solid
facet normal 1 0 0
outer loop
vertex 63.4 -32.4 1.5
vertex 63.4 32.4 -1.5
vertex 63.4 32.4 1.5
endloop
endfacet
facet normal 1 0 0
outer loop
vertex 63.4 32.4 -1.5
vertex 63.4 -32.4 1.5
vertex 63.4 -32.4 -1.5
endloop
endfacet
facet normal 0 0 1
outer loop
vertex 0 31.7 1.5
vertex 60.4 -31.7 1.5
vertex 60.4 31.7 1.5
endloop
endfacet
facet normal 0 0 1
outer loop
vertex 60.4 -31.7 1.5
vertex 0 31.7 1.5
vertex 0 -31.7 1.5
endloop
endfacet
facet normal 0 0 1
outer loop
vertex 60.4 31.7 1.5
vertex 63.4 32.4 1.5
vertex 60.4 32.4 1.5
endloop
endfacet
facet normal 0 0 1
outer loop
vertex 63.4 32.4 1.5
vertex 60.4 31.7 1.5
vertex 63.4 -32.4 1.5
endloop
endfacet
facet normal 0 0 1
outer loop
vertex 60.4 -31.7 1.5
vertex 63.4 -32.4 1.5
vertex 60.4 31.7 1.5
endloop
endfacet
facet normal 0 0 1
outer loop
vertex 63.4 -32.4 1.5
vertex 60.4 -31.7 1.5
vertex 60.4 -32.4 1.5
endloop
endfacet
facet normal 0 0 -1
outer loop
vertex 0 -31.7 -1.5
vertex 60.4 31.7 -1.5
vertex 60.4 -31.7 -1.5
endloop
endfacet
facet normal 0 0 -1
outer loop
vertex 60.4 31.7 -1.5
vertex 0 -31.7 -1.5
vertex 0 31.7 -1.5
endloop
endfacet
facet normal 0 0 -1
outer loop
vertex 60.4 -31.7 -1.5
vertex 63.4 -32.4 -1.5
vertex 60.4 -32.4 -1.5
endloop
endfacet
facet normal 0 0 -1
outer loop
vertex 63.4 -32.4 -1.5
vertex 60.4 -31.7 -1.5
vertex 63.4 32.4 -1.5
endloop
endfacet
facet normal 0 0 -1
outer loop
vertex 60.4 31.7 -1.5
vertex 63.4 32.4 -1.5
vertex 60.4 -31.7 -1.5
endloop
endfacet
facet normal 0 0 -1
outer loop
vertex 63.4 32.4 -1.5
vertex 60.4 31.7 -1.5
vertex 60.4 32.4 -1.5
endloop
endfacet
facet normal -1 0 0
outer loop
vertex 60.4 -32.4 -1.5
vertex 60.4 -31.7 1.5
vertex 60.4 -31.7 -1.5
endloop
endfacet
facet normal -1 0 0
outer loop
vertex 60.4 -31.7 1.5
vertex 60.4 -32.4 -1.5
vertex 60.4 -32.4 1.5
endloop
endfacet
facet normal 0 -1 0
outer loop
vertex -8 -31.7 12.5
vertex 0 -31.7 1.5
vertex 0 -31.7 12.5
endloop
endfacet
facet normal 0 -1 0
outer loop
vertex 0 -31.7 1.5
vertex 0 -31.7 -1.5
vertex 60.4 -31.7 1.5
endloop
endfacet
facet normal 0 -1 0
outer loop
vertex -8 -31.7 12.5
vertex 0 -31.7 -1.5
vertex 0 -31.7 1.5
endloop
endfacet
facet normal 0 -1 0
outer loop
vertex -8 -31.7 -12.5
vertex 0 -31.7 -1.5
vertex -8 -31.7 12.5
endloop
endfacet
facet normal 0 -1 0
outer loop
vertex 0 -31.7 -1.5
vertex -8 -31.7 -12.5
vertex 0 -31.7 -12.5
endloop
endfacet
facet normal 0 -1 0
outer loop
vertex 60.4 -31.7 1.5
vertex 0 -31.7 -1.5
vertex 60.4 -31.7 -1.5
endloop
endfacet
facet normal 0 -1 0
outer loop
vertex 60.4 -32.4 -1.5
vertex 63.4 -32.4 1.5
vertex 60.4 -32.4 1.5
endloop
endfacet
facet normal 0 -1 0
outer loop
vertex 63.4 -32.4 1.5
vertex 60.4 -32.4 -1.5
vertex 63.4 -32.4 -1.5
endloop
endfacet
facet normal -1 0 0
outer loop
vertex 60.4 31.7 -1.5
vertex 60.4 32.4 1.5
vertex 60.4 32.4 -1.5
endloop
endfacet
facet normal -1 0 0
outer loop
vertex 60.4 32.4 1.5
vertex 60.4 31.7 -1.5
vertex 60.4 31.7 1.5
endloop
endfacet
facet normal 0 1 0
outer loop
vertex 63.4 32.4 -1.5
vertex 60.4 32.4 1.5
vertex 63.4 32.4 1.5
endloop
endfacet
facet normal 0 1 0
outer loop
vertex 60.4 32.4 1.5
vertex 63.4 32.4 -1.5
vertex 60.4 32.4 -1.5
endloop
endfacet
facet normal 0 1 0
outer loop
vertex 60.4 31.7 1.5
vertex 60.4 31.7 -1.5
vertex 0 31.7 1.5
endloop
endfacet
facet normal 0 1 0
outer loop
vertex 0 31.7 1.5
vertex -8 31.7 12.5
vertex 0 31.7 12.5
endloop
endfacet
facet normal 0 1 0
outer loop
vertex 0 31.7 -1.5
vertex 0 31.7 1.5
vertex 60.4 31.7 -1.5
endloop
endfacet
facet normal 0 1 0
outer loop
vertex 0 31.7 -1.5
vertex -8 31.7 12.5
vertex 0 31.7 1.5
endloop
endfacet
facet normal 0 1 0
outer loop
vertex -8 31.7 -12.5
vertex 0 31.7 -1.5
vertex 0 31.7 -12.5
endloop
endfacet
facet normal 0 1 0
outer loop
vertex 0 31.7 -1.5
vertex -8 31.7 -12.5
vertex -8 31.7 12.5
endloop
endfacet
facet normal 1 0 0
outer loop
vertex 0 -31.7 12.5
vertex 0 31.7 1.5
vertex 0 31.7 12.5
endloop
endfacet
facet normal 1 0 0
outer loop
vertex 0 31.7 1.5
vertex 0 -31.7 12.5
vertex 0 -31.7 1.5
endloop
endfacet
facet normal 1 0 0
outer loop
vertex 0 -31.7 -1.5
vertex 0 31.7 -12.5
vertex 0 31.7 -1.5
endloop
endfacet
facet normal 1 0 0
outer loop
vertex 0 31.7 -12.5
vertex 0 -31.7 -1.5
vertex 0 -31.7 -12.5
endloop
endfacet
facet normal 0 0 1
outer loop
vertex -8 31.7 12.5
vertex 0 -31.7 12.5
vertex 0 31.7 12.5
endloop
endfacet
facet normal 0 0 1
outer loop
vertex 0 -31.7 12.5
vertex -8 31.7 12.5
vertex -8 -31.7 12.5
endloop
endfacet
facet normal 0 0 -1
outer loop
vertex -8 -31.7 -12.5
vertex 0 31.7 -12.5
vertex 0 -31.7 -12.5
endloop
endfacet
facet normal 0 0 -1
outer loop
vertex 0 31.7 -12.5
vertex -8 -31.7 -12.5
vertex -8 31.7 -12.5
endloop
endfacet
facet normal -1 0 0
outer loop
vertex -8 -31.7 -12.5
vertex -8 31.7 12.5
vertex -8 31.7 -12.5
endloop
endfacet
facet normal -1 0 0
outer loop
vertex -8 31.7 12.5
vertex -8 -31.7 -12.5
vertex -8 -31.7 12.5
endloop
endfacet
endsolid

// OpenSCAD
// file: _blast_gate.scad
// =====================================
// Blast Gate — Shared Library
// Inline sliding blast gate for 51mm OD PVC workshop vacuum lines.
// Sliding blade opens or closes airflow to dust-collection branches.
//
// Coordinate system:
//   Pipe axis: Z. Blade slides along X (handle exits at −X).
//   Slot lies in the X–Y plane, slot_h tall in Z.
//
// bore_d matches socket_id so the body bore is flush with the socket bore (no dust ledge).
//
// Print notes:
//   Body: print with pipe axis vertical (Z-up); slot is horizontal.
//   Supports may be needed to bridge the bore opening at the slot ceiling.
//   Blade: print flat on the build plate.
//
// Stop bump (prevents blade pulling fully out of slot) is omitted in v1.0.0.
// Add a bump on the blade leading edge if desired.
// =====================================

$fn = 64;

// === Parameters (mm) ===

// Pipe
pvc_od           = 51;     // PVC pipe outer diameter — widened 1 mm for slip fit on 50 mm nominal pipe
socket_clearance = 0.4;    // diametral slip-fit clearance on socket bore
socket_id        = pvc_od + socket_clearance;  // 51.4
socket_wall      = 2.5;
socket_od        = socket_id + 2*socket_wall;  // 56.4
socket_length    = 25;     // pipe insertion depth per side

// Internal flow bore: matches socket_id so no ledge forms at the socket/body junction
bore_d           = socket_id;

// Body block (square cross-section, slot through the middle)
frame            = 8;                    // material thickness around bore
body_w           = bore_d + 2*frame;    // Y extent (perpendicular to blade slide)
body_d           = bore_d + 2*frame;    // X extent (along blade slide direction)
plate_t          = 4;                   // plate thickness above/below the slot
end_wall         = 4;                   // closed-end wall at +X joining top/bottom plates; slot open at −X for blade entry
slot_h           = 3.4;                 // gate_thickness + 0.4mm total clearance
body_h           = 2*plate_t + slot_h;  // 11.4 — Z extent between socket bases

// Blade
gate_thickness   = 3;
y_rail           = 2;                  // Y-wall reserve per side; printed wall = y_rail − 0.2 after slot clearance
blade_w          = body_w - 2*y_rail; // narrower than body so Y walls remain intact
blade_travel     = bore_d + 6;         // travel so solid blade fully covers bore
blade_l          = body_d - end_wall;  // spans exactly the slot length in X
handle_w         = blade_w;
handle_t         = 8;                  // handle depth in X
handle_l         = 25;                 // handle height in Z (perpendicular to blade plane)

// Mounting plate (opposite blade-exit side, at +X end of body block)
mount_plate_t      = 4;                           // plate thickness in X
mount_plate_margin = 10;                          // extends this far beyond body_block on Y and Z per side
mount_plate_w      = body_w + 2*mount_plate_margin;
mount_plate_h      = body_h + 2*mount_plate_margin;
mount_hole_d       = 4;                           // M4 / #8 screw clearance
mount_hole_inset   = 5;                           // hole-centre distance from plate edge

// Catch notches (blade-closed retention)
catch_notch_depth = 0.8;  // depth into Y-wall (mm); keeps ≥1 mm of wall remaining
catch_notch_width = 3.0;  // notch extent along X (blade travel direction)
catch_bump_h      = catch_notch_depth - 0.1;  // bump protrusion from blade edge; 0.1 mm clearance at notch far wall

// === Modules ===

// One pipe socket. z_base: Z coordinate of the socket base face.
module socket_stub(z_base) {
    translate([0, 0, z_base])
        difference() {
            cylinder(d=socket_od, h=socket_length);
            translate([0, 0, -0.1])
                cylinder(d=socket_id, h=socket_length + 0.2);
        }
}

// Central body block: plate material above and below the blade slot.
module body_block() {
    difference() {
        cube([body_d, body_w, body_h], center=true);
        // Bore cylinder along pipe axis (Z)
        cylinder(d=bore_d, h=body_h + 1, center=true);
        // Blade slot: open at -X (blade entry), closed at +X by end_wall; Y side walls remain
        translate([-body_d/2 - 1, -(blade_w + 0.4)/2, -slot_h/2])
            cube([body_d + 1 - end_wall, blade_w + 0.4, slot_h]);
        // Catch notches: small recesses in Y-walls at the fully-closed blade position.
        // When the blade is pushed in, its edges snap into these wider pockets and
        // resist sliding back open under vibration.
        for (y_sign = [-1, 1]) {
            translate([body_d/2 - end_wall - catch_notch_width,
                       y_sign > 0 ? (blade_w + 0.4)/2 : -(blade_w + 0.4)/2 - catch_notch_depth,
                       -gate_thickness/2])
                cube([catch_notch_width, catch_notch_depth, gate_thickness]);
        }
    }
}

// Full gate body: central block plus top and bottom pipe sockets.
module gate_body() {
    union() {
        body_block();
        socket_stub(body_h/2);                  // top socket
        socket_stub(-body_h/2 - socket_length); // bottom socket
        mount_plate();
    }
}

// Mounting plate on the +X (closed-end) face, opposite the blade-exit opening.
// Screw holes pass through the plate along X (perpendicular to the mounting surface).
module mount_plate() {
    translate([body_d/2, 0, 0])
    difference() {
        translate([0, -mount_plate_w/2, -mount_plate_h/2])
            cube([mount_plate_t, mount_plate_w, mount_plate_h]);
        for (y_sign = [-1, 1]) {
            for (z_sign = [-1, 1]) {
                translate([-0.1,
                           y_sign * (mount_plate_w/2 - mount_hole_inset),
                           z_sign * (mount_plate_h/2 - mount_hole_inset)])
                    rotate([0, 90, 0])
                        cylinder(d=mount_hole_d, h=mount_plate_t + 0.2);
            }
        }
    }
}

// Sliding blade. Origin at trailing edge (handle side); leading edge at X = blade_l.
// Push blade IN (+X) to close (solid plate covers bore). Pull OUT (−X) by blade_travel
// to open (leading edge clears the bore). No through-hole needed.
module gate_blade() {
    // Blade plate: trailing edge at X=0, leading edge at X=blade_l, centered in Y and Z
    translate([0, -blade_w/2, -gate_thickness/2])
        cube([blade_l, blade_w, gate_thickness]);

    // Handle: perpendicular tab at trailing edge, centered on blade face in Z
    translate([-handle_t, -handle_w/2, -handle_l/2])
        cube([handle_t, handle_w, handle_l]);

    // Catch bumps: protrude in Y at the leading edge, snapping into body catch notches at closed position
    for (y_sign = [-1, 1])
        translate([blade_l - catch_notch_width,
                   y_sign > 0 ? blade_w/2 : -blade_w/2 - catch_bump_h,
                   -gate_thickness/2])
            cube([catch_notch_width, catch_bump_h, gate_thickness]);
}
// main file
// Workshop vacuum blast gate — sliding blade (v1.1: catch bumps added)
// Render this file to generate gate_blade.stl
include <_blast_gate.scad>
gate_blade();
